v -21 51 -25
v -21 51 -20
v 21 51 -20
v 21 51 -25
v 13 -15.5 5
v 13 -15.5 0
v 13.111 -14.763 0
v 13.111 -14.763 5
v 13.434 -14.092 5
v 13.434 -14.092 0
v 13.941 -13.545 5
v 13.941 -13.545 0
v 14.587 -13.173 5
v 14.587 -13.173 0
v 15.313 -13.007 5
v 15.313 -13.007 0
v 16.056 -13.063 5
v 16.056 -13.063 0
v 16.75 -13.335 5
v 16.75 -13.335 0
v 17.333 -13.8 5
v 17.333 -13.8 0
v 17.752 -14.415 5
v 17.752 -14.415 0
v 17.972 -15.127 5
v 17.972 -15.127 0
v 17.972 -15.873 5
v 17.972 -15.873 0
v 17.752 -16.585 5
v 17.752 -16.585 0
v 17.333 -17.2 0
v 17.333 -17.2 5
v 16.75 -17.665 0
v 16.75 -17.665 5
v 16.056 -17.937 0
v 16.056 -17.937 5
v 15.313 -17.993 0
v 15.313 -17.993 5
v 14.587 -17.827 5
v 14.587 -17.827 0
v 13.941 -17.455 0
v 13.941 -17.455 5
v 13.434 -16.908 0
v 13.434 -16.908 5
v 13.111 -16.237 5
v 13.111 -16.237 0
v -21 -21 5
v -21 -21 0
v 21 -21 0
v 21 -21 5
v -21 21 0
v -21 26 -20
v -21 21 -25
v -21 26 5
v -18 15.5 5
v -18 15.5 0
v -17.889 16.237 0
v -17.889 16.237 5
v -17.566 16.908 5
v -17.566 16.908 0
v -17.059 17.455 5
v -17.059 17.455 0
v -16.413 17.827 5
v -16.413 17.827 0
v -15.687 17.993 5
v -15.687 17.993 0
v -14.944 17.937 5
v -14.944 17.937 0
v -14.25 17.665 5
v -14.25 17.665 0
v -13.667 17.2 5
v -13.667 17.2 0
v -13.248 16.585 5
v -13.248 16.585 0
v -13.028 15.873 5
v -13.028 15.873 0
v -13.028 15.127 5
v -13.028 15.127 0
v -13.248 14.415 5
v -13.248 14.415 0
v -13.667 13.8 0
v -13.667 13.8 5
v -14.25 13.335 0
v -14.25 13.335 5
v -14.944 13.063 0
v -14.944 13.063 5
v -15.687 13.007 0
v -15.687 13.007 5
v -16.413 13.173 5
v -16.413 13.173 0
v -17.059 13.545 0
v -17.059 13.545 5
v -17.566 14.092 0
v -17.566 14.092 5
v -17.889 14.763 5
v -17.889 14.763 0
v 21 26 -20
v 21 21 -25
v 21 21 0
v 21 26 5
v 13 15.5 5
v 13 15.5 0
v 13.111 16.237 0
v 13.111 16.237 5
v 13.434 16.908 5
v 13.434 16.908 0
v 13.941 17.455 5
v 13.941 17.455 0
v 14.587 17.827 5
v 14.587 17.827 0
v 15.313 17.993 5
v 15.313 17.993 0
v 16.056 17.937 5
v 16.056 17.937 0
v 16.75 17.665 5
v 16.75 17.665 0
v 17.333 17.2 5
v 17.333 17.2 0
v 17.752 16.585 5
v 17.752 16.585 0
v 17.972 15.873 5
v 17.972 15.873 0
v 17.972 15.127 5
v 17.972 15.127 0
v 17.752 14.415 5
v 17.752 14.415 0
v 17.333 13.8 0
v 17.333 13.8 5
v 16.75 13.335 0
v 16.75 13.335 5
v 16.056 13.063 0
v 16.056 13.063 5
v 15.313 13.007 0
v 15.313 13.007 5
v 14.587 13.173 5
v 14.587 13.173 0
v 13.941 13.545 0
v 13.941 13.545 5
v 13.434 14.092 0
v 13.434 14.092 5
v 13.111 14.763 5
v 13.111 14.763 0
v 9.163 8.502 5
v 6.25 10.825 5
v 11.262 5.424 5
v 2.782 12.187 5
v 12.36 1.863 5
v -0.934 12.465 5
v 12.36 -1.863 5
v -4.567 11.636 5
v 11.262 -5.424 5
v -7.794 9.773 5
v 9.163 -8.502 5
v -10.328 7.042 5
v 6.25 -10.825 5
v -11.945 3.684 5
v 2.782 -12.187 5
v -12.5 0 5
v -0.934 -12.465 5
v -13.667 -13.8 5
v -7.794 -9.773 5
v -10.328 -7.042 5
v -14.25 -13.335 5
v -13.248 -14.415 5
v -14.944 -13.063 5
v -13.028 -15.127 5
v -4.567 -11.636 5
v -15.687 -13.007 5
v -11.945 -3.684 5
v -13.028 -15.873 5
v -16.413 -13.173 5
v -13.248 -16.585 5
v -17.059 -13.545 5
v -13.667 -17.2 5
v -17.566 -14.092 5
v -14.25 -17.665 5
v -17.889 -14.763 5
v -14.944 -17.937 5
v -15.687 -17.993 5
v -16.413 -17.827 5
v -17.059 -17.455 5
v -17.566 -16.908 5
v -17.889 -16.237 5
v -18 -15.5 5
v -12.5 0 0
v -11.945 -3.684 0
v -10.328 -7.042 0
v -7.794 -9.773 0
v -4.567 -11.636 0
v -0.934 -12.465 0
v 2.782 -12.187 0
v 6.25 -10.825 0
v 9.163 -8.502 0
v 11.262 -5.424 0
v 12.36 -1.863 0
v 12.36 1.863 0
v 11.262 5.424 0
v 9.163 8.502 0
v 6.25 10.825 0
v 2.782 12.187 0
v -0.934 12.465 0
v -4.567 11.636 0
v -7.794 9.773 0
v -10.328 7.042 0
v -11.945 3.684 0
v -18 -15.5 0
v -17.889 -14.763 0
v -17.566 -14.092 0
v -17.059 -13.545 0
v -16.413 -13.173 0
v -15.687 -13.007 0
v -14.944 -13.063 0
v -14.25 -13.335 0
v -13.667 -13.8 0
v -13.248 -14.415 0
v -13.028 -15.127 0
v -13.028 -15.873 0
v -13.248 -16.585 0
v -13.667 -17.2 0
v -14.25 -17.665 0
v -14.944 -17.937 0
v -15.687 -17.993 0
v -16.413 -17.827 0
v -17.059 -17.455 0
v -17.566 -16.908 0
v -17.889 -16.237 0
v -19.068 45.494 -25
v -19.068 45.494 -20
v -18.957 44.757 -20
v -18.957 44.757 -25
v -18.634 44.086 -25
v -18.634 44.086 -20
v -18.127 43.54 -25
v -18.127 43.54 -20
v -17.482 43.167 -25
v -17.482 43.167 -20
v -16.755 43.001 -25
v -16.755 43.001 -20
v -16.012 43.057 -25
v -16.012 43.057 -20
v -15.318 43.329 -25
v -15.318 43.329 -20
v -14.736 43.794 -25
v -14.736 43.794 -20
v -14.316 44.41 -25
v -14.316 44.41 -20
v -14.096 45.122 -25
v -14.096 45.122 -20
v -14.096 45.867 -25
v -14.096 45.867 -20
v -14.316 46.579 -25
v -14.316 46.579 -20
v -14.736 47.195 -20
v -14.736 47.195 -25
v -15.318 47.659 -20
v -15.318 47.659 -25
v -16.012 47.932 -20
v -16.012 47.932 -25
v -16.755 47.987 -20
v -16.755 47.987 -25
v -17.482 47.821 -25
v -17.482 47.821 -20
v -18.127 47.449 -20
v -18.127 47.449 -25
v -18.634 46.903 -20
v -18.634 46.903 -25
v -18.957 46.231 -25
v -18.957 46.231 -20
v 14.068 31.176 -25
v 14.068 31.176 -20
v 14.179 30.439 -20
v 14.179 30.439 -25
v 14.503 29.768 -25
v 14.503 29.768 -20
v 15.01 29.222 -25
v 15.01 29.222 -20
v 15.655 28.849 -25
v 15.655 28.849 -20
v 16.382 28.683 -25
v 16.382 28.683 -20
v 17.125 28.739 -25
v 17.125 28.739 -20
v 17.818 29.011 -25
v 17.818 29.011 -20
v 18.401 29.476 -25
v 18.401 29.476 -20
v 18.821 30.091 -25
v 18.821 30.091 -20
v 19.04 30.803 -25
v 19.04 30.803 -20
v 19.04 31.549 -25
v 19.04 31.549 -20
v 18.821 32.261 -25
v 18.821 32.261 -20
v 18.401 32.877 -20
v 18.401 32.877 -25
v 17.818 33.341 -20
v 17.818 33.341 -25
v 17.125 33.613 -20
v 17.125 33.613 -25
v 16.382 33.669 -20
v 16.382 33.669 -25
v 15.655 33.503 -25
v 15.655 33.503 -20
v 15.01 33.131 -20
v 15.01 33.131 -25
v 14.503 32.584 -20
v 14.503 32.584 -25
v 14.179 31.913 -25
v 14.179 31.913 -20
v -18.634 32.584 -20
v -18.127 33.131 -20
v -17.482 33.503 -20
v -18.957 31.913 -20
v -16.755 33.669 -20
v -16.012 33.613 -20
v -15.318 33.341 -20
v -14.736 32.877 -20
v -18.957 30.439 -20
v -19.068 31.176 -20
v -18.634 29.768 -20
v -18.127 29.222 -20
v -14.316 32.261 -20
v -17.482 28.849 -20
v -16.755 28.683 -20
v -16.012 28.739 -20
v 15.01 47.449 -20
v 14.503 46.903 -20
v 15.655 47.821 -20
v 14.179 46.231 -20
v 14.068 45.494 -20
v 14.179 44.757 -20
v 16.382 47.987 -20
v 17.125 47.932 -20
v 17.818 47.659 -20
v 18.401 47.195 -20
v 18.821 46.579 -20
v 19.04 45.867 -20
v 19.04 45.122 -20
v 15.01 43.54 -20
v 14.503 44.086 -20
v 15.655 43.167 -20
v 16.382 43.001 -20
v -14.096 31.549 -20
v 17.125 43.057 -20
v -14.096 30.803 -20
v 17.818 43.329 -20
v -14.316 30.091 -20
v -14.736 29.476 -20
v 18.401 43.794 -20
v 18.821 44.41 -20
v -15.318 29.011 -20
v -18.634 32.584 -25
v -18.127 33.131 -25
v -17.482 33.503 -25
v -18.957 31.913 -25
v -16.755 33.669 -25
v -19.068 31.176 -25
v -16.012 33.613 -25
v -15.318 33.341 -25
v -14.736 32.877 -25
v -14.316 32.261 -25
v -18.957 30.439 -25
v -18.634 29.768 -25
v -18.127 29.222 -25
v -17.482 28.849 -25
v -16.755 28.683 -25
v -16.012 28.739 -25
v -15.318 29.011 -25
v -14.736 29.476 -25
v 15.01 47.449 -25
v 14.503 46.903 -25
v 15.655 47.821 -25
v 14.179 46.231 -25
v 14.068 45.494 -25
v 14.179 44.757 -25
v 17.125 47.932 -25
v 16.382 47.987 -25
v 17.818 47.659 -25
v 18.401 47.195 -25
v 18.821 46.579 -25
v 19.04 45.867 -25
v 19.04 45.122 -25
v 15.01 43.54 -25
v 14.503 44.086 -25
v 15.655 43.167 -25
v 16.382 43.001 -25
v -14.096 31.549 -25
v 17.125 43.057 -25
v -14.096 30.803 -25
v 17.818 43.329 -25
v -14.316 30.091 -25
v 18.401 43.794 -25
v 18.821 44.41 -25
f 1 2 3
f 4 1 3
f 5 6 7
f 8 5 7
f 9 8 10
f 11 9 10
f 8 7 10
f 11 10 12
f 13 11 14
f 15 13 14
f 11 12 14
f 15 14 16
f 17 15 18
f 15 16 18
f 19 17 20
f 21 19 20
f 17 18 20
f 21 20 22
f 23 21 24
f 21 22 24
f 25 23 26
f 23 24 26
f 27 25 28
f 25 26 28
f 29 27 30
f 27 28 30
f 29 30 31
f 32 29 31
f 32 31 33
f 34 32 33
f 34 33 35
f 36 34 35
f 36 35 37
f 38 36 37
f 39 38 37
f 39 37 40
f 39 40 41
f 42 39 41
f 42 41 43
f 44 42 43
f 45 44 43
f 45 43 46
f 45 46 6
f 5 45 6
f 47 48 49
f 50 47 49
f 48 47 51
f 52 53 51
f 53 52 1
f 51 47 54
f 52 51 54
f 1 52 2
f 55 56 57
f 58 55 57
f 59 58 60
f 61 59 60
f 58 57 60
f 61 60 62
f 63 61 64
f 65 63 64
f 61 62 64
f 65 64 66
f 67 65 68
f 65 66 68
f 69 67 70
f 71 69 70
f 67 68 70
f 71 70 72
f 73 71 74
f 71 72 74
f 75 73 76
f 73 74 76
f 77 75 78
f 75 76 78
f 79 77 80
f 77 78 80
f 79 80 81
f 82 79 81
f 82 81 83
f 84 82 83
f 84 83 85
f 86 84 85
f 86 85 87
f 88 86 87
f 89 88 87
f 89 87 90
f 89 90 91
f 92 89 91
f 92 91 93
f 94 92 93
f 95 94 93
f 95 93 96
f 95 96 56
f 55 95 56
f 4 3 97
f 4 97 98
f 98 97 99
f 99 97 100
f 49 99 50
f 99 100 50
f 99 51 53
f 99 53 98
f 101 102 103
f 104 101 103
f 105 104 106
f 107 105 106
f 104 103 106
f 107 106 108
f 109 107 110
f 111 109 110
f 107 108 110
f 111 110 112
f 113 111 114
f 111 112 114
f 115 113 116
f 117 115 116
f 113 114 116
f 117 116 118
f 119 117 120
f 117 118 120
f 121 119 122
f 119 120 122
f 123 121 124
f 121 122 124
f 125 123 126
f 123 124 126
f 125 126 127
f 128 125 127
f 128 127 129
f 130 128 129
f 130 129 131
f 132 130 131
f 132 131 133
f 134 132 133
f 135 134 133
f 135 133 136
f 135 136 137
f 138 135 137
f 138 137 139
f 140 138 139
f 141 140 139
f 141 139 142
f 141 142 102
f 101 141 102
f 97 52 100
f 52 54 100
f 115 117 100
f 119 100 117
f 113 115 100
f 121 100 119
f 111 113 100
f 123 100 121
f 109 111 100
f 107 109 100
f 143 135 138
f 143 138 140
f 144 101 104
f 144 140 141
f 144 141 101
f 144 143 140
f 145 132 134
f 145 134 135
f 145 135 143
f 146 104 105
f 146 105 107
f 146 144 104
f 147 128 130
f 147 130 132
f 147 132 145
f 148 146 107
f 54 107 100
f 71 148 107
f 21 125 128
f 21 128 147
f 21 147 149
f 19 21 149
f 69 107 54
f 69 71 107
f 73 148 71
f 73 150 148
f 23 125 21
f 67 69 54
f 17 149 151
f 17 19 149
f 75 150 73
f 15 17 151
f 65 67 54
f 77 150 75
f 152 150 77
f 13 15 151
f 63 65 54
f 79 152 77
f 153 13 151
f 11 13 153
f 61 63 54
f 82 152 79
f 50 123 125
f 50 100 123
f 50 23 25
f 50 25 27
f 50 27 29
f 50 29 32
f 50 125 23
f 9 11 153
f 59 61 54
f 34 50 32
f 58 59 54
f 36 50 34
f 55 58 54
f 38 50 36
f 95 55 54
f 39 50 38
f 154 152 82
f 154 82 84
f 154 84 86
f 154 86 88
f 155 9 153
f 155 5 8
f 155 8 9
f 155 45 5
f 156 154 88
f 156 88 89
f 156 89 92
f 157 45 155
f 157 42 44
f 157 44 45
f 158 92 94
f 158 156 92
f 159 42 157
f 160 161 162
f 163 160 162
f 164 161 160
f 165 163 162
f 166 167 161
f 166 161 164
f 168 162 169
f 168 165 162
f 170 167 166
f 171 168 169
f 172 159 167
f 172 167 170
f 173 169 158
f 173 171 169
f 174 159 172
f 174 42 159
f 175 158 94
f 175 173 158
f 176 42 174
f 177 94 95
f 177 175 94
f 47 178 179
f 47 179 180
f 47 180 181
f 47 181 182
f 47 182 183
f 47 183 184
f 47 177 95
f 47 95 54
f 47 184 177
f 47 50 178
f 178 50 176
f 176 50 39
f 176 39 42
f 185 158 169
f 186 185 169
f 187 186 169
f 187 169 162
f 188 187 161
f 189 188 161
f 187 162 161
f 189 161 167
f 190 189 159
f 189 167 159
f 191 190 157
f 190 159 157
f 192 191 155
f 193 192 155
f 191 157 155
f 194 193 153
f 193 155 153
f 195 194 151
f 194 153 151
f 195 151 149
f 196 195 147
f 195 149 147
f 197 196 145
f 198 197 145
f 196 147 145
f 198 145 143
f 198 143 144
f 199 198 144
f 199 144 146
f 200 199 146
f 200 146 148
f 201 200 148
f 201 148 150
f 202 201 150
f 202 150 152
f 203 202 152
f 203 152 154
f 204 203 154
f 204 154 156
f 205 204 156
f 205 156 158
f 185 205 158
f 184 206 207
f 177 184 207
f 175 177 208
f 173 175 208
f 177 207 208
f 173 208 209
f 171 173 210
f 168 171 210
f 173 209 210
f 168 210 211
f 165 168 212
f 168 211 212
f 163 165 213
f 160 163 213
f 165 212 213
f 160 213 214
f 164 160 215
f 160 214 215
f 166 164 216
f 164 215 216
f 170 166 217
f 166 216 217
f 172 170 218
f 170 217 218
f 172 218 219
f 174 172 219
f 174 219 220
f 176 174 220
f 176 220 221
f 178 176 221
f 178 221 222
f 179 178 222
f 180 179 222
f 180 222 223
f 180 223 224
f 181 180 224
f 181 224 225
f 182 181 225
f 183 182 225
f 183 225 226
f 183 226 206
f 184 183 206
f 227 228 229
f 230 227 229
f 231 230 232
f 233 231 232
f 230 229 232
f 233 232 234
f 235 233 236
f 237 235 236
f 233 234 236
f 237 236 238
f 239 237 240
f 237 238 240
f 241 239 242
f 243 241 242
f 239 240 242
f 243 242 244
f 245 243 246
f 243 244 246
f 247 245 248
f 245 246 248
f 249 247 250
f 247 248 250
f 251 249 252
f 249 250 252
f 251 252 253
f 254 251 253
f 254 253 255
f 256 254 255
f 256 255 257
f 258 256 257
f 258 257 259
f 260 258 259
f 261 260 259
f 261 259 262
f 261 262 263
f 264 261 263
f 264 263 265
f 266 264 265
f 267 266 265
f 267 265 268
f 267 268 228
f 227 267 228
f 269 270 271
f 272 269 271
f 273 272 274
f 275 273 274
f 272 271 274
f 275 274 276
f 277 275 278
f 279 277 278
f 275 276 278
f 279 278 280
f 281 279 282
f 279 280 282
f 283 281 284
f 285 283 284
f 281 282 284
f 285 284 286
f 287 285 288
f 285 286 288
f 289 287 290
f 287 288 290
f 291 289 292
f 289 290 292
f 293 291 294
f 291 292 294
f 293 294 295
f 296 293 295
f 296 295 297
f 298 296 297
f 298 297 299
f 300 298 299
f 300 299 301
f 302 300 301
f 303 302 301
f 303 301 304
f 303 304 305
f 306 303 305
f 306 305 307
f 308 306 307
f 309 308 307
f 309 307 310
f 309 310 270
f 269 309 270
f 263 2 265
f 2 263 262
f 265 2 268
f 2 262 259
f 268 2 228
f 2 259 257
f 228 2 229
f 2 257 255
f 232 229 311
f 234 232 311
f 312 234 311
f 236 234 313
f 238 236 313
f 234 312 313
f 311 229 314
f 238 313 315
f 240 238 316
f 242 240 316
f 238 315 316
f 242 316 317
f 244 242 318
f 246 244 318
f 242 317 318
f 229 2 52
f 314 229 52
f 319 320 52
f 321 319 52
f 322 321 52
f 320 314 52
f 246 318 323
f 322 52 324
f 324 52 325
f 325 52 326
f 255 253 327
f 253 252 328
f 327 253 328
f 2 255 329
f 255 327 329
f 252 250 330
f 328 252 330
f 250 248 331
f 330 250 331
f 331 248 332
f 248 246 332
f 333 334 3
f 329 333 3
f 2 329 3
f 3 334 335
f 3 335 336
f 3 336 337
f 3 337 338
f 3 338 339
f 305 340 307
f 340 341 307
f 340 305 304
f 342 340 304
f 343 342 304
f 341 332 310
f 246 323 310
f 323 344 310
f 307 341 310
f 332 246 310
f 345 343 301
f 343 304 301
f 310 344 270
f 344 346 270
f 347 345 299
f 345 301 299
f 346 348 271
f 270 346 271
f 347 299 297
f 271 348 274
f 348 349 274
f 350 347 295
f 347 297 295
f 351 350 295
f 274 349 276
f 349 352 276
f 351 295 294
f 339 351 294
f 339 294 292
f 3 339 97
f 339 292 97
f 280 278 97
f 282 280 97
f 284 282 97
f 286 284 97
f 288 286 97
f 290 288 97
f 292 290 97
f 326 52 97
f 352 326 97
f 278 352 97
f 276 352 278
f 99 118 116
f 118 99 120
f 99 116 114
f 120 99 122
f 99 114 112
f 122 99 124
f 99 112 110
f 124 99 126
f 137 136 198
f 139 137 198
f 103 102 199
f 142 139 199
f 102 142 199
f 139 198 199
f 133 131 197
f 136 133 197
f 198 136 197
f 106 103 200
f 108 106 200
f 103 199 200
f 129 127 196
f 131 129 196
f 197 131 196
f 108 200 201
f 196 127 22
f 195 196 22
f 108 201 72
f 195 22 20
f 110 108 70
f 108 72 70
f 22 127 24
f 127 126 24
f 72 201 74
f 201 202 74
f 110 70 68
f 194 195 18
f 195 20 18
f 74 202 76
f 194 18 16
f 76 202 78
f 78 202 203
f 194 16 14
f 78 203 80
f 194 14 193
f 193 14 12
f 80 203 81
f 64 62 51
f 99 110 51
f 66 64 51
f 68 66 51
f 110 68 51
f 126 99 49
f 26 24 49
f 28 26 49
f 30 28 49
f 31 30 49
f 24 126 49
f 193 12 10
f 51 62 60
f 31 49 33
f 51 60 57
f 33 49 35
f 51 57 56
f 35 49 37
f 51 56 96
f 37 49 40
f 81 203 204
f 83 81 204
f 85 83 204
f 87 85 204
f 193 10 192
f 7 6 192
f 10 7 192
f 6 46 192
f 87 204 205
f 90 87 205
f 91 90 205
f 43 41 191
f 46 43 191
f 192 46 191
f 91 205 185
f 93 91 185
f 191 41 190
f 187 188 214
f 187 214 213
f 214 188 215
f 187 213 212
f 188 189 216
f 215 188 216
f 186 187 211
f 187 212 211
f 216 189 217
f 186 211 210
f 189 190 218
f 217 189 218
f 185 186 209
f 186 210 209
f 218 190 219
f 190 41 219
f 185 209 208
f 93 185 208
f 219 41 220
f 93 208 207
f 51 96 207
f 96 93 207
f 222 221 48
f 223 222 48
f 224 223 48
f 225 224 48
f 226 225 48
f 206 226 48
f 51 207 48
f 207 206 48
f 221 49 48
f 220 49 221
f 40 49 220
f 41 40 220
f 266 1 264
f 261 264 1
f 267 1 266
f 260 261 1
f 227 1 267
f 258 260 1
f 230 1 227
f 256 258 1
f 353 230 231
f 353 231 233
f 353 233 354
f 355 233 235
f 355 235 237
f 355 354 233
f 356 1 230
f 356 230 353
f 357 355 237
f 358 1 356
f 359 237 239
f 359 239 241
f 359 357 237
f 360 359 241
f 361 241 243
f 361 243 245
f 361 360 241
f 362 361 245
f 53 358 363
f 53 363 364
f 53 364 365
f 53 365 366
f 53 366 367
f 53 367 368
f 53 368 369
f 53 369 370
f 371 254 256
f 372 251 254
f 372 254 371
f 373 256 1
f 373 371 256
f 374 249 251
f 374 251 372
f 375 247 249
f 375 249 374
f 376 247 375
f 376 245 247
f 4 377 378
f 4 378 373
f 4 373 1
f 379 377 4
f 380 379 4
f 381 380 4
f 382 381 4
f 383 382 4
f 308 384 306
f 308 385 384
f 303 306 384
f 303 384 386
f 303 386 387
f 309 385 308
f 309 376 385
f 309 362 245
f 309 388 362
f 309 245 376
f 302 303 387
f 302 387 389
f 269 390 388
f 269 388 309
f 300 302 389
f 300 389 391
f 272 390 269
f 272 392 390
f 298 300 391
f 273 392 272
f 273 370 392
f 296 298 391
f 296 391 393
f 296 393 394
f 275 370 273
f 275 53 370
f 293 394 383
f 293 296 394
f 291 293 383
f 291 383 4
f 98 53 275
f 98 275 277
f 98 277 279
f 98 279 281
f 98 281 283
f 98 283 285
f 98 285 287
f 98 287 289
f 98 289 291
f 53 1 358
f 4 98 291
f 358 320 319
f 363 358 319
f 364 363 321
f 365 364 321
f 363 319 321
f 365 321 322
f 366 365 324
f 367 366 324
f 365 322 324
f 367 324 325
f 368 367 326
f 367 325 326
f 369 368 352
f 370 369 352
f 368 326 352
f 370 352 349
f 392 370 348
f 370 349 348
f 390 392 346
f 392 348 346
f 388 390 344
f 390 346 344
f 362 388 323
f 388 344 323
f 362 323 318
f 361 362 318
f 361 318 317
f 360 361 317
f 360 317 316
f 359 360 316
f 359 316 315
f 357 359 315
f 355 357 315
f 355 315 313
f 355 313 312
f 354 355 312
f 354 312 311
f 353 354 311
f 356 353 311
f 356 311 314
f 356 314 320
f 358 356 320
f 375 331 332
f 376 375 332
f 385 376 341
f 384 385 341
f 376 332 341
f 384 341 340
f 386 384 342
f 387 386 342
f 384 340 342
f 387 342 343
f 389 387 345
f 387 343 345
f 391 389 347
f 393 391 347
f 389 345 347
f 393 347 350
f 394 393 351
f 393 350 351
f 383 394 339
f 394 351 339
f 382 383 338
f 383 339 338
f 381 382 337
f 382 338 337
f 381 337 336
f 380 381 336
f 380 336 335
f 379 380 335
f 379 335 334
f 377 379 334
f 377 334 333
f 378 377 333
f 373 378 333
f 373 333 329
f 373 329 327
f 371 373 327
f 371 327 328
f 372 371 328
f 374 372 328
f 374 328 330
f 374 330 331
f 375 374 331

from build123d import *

# Parameters (mm, degrees)
F0_W     = 42
F0_H     = 42
F1_DEPTH = 5
F3_D     = 5
F4_W     = 42
F4_H     = 5
F5_DEPTH = 5
F6_W     = 42
F6_H     = 5
F7_DEPTH = 20
F8_W     = 42
F8_H     = 5
F8_H_2   = 25
F9_DEPTH = 5
F11_D    = 5
F13_D    = 25


with BuildPart() as f1:
    # F0 (on Top) → F1 (new body)
    with BuildSketch(Plane.XY):
        Rectangle(F0_W, F0_H)
    extrude(amount=F1_DEPTH)

    # F3 (through all)
    with Locations(Plane.XY.offset(5)):
        with Locations((-15.5, 15.5), (15.5, 15.5), (15.5, -15.5), (-15.5, -15.5)):
            Hole(F3_D / 2)

    # F4 (on face) → F5 (join)
    with BuildSketch(Plane(origin=(0, 21, 0), x_dir=(-1, 0, 0), z_dir=(0, 1, 0))):
        with Locations((0, 2.5)):
            Rectangle(F4_W, F4_H)
    extrude(amount=F5_DEPTH)

    # F6 (on face) → F7 (join)
    with BuildSketch(Plane(origin=(0, 0, 0), x_dir=(1, 0, 0), z_dir=(0, 0, -1))):
        with Locations((0, -23.5)):
            Rectangle(F6_W, F6_H)
    extrude(amount=F7_DEPTH)

    # F8 (on face) → F9 (join)
    with BuildSketch(Plane(origin=(0, 0, -20), x_dir=(1, 0, 0), z_dir=(0, 0, -1))):
        with Locations((0, -23.5)):
            Rectangle(F8_W, F8_H)
        with Locations((0, -38.5)):
            Rectangle(F8_W, F8_H_2)
    extrude(amount=F9_DEPTH)

    # F11 (through all)
    with Locations(Plane(origin=(0, 0, -25), x_dir=(1, 0, 0), z_dir=(0, 0, -1))):
        with Locations((-16.56834, -31.176092), (16.56834, -31.176092), (16.56834, -45.494268), (-16.56834, -45.494268)):
            Hole(F11_D / 2)

    # F13 (through all)
    with Locations(Plane(origin=(0, 0, 0), x_dir=(1, 0, 0), z_dir=(0, 0, -1))):
        with Locations((0, 0)):
            Hole(F13_D / 2)


solid = f1.part
